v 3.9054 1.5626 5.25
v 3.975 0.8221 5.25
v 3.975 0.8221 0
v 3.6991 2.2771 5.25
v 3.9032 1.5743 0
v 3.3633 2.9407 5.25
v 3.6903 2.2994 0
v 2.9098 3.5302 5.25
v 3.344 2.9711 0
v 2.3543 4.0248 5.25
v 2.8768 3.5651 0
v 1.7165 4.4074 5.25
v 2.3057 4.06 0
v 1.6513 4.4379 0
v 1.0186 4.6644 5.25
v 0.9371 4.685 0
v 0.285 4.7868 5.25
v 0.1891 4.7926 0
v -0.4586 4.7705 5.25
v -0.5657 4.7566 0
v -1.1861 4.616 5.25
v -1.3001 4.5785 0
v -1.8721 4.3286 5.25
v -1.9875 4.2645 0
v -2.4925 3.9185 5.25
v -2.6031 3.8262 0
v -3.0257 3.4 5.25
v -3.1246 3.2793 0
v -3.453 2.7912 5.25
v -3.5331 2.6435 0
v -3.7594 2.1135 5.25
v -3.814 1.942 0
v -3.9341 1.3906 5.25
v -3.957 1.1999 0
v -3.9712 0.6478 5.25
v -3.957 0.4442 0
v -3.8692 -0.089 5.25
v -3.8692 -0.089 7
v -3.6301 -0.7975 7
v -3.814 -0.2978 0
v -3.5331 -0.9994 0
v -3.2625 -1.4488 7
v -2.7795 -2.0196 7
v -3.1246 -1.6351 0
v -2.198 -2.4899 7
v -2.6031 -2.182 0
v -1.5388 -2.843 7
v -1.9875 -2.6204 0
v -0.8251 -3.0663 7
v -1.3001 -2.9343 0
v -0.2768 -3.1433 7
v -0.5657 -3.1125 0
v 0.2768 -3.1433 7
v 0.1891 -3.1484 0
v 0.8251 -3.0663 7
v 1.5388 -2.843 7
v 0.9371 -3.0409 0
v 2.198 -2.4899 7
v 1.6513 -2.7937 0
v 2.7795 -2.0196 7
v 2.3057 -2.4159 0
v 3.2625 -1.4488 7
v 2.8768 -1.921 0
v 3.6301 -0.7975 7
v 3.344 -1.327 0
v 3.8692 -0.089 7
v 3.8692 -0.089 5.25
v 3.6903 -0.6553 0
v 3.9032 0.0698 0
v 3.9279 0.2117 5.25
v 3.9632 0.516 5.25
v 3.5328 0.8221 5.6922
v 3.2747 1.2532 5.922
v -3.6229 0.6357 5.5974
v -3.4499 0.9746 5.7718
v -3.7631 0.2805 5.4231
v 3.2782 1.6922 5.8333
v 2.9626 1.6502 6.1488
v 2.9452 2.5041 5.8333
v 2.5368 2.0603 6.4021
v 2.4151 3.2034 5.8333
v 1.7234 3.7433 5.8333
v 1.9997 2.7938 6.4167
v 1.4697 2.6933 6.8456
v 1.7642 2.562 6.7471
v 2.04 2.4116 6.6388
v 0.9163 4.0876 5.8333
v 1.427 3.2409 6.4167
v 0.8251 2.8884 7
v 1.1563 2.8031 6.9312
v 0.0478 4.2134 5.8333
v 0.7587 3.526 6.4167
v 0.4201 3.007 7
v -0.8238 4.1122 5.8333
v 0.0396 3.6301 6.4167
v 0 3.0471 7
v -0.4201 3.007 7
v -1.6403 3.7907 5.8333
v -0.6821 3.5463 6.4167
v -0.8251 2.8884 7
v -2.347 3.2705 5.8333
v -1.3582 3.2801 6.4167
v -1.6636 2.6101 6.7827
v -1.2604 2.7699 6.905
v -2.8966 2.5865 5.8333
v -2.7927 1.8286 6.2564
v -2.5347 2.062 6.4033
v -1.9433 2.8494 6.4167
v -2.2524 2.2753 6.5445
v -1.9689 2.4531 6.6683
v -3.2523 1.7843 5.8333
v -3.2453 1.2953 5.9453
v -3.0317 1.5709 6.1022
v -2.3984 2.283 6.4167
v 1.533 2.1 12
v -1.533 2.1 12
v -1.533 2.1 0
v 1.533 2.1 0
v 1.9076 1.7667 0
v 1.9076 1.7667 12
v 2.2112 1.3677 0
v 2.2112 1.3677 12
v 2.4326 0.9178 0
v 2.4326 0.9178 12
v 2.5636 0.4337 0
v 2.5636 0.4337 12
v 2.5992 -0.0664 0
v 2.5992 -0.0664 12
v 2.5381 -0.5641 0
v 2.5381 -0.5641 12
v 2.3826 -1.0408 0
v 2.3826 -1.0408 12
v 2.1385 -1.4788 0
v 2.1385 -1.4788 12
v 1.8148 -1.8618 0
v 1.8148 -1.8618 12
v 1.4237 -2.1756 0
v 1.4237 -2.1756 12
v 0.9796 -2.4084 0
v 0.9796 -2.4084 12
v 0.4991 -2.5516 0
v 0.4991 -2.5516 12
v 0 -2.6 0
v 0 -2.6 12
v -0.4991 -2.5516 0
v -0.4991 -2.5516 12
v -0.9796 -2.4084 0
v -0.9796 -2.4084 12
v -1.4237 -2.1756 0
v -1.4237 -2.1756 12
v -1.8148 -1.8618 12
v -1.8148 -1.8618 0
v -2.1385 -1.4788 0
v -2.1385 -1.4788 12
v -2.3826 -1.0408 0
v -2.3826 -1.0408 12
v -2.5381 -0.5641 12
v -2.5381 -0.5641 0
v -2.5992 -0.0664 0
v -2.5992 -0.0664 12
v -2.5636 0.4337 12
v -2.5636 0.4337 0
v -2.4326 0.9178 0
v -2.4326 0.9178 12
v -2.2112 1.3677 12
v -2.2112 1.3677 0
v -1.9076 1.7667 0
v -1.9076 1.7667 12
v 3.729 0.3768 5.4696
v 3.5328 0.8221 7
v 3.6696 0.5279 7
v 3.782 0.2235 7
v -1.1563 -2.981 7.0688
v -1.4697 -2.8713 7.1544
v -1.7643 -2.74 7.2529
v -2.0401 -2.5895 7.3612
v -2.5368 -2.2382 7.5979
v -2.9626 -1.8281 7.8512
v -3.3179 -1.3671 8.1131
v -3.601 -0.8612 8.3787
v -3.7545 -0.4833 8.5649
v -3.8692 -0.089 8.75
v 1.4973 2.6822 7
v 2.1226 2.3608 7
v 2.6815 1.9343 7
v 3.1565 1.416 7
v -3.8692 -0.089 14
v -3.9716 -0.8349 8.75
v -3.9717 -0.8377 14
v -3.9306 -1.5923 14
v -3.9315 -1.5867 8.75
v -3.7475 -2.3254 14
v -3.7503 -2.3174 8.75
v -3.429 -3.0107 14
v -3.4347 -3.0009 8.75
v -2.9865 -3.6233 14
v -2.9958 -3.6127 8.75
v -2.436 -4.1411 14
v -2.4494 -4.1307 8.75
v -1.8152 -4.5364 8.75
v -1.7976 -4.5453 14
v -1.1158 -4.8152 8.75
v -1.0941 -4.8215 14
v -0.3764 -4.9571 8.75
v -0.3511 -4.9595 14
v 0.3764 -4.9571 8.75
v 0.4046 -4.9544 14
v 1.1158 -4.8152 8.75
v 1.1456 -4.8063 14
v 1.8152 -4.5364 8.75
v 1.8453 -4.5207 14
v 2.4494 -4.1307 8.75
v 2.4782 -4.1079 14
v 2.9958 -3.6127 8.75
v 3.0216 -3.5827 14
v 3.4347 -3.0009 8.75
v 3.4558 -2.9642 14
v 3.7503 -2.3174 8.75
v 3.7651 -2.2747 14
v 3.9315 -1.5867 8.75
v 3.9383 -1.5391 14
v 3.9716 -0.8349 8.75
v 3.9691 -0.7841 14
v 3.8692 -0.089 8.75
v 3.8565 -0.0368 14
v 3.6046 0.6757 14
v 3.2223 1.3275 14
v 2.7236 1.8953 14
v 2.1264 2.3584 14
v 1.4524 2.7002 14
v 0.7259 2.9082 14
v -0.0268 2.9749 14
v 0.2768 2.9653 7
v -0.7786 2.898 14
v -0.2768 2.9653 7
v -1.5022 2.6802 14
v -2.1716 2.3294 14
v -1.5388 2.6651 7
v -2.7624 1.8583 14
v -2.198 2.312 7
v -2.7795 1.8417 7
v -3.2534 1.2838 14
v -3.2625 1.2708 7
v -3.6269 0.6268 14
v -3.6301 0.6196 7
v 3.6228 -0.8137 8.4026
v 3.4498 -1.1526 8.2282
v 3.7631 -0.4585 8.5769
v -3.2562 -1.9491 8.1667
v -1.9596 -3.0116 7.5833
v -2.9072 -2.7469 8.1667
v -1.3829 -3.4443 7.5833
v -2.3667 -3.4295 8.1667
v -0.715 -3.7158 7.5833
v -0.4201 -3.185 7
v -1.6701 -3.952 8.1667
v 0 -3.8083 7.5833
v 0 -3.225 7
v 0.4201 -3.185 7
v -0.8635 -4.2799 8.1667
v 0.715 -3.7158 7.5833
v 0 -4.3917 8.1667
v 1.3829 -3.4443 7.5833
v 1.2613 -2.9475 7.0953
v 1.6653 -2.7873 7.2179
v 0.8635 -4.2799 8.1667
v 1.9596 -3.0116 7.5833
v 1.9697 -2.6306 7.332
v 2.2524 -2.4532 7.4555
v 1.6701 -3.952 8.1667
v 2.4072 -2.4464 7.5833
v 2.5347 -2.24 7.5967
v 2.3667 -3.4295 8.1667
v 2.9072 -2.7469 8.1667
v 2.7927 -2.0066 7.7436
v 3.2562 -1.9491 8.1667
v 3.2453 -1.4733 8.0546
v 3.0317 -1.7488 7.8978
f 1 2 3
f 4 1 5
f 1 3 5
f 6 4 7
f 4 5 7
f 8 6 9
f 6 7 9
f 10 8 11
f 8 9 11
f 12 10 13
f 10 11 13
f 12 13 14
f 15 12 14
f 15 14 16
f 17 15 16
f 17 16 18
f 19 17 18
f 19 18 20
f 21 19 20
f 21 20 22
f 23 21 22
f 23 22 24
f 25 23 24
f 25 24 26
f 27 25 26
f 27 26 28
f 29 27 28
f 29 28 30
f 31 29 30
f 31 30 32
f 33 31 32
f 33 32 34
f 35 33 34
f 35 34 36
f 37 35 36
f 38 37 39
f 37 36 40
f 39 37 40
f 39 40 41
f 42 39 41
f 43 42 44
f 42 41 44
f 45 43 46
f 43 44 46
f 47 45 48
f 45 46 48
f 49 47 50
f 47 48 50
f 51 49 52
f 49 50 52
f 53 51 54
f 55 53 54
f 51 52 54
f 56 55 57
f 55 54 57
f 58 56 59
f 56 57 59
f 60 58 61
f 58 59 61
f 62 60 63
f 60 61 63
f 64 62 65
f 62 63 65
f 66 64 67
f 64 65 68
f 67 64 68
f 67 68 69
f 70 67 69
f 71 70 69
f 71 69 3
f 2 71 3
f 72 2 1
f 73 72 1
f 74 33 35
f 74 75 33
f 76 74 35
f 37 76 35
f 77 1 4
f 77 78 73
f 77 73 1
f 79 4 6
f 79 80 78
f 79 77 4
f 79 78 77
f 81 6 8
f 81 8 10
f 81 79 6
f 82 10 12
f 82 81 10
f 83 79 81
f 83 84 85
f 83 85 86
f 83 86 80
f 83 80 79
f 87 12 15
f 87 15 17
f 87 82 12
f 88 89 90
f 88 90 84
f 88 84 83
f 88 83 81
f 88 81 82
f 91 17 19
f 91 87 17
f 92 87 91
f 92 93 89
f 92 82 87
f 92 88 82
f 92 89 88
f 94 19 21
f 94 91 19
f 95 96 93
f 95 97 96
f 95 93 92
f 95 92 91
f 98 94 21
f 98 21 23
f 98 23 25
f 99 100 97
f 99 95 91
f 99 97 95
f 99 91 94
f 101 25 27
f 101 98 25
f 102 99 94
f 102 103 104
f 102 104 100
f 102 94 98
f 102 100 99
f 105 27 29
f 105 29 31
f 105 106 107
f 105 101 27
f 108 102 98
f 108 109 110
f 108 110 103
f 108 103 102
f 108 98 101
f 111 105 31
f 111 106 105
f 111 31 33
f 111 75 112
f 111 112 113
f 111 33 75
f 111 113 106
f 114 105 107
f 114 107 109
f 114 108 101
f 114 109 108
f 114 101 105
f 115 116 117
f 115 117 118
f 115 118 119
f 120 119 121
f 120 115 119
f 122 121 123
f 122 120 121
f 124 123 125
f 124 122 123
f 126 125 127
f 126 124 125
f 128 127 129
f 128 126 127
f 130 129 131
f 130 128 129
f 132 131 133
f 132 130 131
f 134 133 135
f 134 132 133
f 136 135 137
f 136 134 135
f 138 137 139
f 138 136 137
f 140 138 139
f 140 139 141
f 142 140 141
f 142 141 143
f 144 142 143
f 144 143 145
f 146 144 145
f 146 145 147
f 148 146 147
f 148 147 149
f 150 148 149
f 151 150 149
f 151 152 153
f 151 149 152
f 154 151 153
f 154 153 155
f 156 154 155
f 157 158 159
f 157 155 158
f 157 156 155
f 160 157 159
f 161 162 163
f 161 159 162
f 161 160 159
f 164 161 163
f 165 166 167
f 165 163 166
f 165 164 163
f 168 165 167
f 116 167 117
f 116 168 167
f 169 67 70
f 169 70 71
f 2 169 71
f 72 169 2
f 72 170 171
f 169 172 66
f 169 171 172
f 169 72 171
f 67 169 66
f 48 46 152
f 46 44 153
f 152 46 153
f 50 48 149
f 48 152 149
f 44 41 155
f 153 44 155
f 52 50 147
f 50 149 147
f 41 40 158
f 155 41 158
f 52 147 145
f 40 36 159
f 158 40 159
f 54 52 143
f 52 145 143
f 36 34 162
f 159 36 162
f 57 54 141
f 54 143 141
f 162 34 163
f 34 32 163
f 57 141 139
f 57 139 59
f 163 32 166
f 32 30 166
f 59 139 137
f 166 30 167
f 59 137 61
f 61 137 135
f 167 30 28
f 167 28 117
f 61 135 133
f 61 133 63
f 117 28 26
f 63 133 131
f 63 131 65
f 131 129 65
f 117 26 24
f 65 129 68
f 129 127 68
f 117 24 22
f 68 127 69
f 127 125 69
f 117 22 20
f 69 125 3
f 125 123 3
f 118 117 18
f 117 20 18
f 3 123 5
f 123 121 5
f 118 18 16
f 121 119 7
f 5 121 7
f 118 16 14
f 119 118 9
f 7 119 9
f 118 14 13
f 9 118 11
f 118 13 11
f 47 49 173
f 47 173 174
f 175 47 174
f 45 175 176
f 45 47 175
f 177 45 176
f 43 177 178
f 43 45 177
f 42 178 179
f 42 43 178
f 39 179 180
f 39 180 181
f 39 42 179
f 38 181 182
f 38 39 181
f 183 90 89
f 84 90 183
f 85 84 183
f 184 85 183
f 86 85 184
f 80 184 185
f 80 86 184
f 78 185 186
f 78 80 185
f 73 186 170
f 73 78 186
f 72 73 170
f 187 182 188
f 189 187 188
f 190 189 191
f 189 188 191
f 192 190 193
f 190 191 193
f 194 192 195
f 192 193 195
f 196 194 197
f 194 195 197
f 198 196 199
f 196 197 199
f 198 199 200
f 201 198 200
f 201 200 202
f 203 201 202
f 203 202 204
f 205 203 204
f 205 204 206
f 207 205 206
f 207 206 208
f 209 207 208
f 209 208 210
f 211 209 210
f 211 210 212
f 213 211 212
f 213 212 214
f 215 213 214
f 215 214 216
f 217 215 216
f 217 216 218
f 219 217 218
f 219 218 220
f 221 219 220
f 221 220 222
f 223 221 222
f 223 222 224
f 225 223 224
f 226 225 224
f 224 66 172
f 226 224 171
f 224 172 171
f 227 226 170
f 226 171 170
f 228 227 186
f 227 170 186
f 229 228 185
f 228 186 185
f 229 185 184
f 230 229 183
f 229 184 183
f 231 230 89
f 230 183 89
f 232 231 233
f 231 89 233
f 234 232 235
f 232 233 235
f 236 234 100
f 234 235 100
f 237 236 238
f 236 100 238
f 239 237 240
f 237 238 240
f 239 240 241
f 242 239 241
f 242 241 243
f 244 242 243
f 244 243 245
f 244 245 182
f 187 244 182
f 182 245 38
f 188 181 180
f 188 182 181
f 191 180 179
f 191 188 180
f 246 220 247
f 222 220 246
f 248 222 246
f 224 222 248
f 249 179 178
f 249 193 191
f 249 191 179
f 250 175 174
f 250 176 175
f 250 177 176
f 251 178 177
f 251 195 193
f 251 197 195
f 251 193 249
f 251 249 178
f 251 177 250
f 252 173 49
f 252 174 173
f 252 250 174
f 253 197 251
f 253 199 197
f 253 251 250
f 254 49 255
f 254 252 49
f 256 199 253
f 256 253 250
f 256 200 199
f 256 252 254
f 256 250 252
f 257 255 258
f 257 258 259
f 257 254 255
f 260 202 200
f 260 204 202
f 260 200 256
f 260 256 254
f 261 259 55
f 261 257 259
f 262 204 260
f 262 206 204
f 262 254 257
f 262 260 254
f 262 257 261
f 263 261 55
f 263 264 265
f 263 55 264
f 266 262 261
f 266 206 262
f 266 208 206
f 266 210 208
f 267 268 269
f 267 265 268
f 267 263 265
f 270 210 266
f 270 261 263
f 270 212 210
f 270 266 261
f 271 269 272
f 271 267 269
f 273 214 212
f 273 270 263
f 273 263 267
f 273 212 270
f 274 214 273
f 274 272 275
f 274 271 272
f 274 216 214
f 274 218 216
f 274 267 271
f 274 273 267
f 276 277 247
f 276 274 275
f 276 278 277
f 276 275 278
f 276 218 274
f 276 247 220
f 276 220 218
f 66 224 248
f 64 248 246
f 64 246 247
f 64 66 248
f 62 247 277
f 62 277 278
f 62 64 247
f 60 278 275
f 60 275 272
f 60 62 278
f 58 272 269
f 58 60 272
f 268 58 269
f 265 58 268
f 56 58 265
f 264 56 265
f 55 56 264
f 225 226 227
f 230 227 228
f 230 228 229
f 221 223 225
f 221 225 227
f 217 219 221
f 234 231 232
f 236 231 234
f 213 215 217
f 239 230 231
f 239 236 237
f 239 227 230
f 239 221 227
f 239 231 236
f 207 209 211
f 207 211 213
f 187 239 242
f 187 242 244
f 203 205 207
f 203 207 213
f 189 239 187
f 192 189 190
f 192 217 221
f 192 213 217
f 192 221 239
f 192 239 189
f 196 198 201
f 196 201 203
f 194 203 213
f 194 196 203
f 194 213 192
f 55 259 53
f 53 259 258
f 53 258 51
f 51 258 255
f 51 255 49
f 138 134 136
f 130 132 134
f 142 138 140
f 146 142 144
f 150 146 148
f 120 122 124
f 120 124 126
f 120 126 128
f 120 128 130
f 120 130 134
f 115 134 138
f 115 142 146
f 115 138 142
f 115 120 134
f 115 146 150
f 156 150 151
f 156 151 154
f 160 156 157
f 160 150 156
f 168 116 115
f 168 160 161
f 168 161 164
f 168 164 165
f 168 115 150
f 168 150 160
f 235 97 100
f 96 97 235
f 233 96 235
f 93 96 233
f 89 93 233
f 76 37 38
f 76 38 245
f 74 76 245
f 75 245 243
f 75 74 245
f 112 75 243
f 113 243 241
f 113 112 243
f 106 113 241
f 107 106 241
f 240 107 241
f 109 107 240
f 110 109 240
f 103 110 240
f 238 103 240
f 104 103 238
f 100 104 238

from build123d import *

# Parameters (mm, degrees)
ESQUISSE1_R             = 3.975
BOSS_EXTRU_1_DEPTH      = 7
ESQUISSE2_R             = 3.975
BOSS_EXTRU_2_DEPTH      = 7
ENL_V_START             = -2
ENL_V_MAT_EXTRU_1_DEPTH = 14.38022269
CHANFREIN2_SIZE         = 1.75
CHANFREIN4_SIZE         = 1.75


with BuildPart() as part:
    # Esquisse1 → Boss.-Extru.1 (new body)
    with BuildSketch(Plane.XY):
        with Locations((0, 0.822072072)):
            Circle(ESQUISSE1_R)
    extrude(amount=BOSS_EXTRU_1_DEPTH)

    # Esquisse2 → Boss.-Extru.2 (add)
    with BuildSketch(Plane.XY.offset(7)):
        with Locations(Location((0, -1, 0), (0, 0, 166.750525957))):
            Circle(ESQUISSE2_R)
    extrude(amount=BOSS_EXTRU_2_DEPTH)

    # Esquisse3 → Enlèv. mat.-Extru.1 (cut, through all)
    with BuildSketch(Plane.XY.offset(14).offset(ENL_V_START)):
        with BuildLine():
            Line((-1.532970972, 2.1), (1.532970972, 2.1))
            ThreePointArc((1.532970972, 2.1), (0, -2.6), (-1.532970972, 2.1))
        make_face()
    extrude(amount=-ENL_V_MAT_EXTRU_1_DEPTH, mode=Mode.SUBTRACT)

    # Chanfrein2
    # the kernel refuses this chamfer: 1.75 mm, written as the material it takes off along each edge
    with BuildSketch(Plane(origin=(0, 0.822072072, 7), x_dir=(1, 0, 0), z_dir=(0, -1, 0))) as chanfrein2_piece_1_section:
        Polygon((3.975, -CHANFREIN2_SIZE), (3.975 - CHANFREIN2_SIZE, 0), (3.975, 0), align=None)
    chanfrein2_piece_1 = revolve(axis=Axis((0, 0.822072072, 7), (0, 0, 1)), revolution_arc=258.239304613, mode=Mode.PRIVATE)
    chanfrein2_piece_1 = chanfrein2_piece_1 - Plane(origin=(0, -1, 6.142541617), x_dir=(-0.9733813624059963, 0.22919145560130838, 0), z_dir=(0, 0, -1)) * Cylinder(3.975, 16, mode=Mode.PRIVATE)
    add(chanfrein2_piece_1, mode=Mode.SUBTRACT)
    with BuildSketch(Plane(origin=(0, 0.822072072, 7), x_dir=(0.20586939253859726, -0.9785794772095873, 0), z_dir=(-0.9785794772095873, -0.20586939253859726, 0))) as chanfrein2_piece_2_section:
        Polygon((3.975, -CHANFREIN2_SIZE), (3.975 - CHANFREIN2_SIZE, 0), (3.975, 0), align=None)
    chanfrein2_piece_2 = revolve(axis=Axis((0, 0.822072072, 7), (0, 0, 1)), revolution_arc=78.119602811, mode=Mode.PRIVATE)
    chanfrein2_piece_2 = chanfrein2_piece_2 - Plane(origin=(0, -1, 6.194476716), x_dir=(-0.9733813624059963, 0.22919145560130838, 0), z_dir=(0, 0, -1)) * Cylinder(3.975, 16, mode=Mode.PRIVATE)
    add(chanfrein2_piece_2, mode=Mode.SUBTRACT)

    # Chanfrein4
    # the kernel refuses this chamfer: 1.75 mm, written as the material it takes off along each edge
    with BuildSketch(Plane(origin=(0, -1, 7), x_dir=(-0.2035326199648153, 0.9790681654564498, 0), z_dir=(0.9790681654564498, 0.2035326199648153, 0))) as chanfrein4_piece_1_section:
        Polygon((3.975 - CHANFREIN4_SIZE, 0), (3.975, CHANFREIN4_SIZE), (3.975, 0), align=None)
    chanfrein4_piece_1 = revolve(axis=Axis((0, -1, 7), (0, 0, 1)), revolution_arc=336.512773019, mode=Mode.PRIVATE)
    chanfrein4_piece_1 = chanfrein4_piece_1 - Plane(origin=(0, 0.822072072, 7.857337324), x_dir=(1, 0, 0), z_dir=(0, 0, -1)) * Cylinder(3.975, 16, mode=Mode.PRIVATE)
    add(chanfrein4_piece_1, mode=Mode.SUBTRACT)


solid = part.part
